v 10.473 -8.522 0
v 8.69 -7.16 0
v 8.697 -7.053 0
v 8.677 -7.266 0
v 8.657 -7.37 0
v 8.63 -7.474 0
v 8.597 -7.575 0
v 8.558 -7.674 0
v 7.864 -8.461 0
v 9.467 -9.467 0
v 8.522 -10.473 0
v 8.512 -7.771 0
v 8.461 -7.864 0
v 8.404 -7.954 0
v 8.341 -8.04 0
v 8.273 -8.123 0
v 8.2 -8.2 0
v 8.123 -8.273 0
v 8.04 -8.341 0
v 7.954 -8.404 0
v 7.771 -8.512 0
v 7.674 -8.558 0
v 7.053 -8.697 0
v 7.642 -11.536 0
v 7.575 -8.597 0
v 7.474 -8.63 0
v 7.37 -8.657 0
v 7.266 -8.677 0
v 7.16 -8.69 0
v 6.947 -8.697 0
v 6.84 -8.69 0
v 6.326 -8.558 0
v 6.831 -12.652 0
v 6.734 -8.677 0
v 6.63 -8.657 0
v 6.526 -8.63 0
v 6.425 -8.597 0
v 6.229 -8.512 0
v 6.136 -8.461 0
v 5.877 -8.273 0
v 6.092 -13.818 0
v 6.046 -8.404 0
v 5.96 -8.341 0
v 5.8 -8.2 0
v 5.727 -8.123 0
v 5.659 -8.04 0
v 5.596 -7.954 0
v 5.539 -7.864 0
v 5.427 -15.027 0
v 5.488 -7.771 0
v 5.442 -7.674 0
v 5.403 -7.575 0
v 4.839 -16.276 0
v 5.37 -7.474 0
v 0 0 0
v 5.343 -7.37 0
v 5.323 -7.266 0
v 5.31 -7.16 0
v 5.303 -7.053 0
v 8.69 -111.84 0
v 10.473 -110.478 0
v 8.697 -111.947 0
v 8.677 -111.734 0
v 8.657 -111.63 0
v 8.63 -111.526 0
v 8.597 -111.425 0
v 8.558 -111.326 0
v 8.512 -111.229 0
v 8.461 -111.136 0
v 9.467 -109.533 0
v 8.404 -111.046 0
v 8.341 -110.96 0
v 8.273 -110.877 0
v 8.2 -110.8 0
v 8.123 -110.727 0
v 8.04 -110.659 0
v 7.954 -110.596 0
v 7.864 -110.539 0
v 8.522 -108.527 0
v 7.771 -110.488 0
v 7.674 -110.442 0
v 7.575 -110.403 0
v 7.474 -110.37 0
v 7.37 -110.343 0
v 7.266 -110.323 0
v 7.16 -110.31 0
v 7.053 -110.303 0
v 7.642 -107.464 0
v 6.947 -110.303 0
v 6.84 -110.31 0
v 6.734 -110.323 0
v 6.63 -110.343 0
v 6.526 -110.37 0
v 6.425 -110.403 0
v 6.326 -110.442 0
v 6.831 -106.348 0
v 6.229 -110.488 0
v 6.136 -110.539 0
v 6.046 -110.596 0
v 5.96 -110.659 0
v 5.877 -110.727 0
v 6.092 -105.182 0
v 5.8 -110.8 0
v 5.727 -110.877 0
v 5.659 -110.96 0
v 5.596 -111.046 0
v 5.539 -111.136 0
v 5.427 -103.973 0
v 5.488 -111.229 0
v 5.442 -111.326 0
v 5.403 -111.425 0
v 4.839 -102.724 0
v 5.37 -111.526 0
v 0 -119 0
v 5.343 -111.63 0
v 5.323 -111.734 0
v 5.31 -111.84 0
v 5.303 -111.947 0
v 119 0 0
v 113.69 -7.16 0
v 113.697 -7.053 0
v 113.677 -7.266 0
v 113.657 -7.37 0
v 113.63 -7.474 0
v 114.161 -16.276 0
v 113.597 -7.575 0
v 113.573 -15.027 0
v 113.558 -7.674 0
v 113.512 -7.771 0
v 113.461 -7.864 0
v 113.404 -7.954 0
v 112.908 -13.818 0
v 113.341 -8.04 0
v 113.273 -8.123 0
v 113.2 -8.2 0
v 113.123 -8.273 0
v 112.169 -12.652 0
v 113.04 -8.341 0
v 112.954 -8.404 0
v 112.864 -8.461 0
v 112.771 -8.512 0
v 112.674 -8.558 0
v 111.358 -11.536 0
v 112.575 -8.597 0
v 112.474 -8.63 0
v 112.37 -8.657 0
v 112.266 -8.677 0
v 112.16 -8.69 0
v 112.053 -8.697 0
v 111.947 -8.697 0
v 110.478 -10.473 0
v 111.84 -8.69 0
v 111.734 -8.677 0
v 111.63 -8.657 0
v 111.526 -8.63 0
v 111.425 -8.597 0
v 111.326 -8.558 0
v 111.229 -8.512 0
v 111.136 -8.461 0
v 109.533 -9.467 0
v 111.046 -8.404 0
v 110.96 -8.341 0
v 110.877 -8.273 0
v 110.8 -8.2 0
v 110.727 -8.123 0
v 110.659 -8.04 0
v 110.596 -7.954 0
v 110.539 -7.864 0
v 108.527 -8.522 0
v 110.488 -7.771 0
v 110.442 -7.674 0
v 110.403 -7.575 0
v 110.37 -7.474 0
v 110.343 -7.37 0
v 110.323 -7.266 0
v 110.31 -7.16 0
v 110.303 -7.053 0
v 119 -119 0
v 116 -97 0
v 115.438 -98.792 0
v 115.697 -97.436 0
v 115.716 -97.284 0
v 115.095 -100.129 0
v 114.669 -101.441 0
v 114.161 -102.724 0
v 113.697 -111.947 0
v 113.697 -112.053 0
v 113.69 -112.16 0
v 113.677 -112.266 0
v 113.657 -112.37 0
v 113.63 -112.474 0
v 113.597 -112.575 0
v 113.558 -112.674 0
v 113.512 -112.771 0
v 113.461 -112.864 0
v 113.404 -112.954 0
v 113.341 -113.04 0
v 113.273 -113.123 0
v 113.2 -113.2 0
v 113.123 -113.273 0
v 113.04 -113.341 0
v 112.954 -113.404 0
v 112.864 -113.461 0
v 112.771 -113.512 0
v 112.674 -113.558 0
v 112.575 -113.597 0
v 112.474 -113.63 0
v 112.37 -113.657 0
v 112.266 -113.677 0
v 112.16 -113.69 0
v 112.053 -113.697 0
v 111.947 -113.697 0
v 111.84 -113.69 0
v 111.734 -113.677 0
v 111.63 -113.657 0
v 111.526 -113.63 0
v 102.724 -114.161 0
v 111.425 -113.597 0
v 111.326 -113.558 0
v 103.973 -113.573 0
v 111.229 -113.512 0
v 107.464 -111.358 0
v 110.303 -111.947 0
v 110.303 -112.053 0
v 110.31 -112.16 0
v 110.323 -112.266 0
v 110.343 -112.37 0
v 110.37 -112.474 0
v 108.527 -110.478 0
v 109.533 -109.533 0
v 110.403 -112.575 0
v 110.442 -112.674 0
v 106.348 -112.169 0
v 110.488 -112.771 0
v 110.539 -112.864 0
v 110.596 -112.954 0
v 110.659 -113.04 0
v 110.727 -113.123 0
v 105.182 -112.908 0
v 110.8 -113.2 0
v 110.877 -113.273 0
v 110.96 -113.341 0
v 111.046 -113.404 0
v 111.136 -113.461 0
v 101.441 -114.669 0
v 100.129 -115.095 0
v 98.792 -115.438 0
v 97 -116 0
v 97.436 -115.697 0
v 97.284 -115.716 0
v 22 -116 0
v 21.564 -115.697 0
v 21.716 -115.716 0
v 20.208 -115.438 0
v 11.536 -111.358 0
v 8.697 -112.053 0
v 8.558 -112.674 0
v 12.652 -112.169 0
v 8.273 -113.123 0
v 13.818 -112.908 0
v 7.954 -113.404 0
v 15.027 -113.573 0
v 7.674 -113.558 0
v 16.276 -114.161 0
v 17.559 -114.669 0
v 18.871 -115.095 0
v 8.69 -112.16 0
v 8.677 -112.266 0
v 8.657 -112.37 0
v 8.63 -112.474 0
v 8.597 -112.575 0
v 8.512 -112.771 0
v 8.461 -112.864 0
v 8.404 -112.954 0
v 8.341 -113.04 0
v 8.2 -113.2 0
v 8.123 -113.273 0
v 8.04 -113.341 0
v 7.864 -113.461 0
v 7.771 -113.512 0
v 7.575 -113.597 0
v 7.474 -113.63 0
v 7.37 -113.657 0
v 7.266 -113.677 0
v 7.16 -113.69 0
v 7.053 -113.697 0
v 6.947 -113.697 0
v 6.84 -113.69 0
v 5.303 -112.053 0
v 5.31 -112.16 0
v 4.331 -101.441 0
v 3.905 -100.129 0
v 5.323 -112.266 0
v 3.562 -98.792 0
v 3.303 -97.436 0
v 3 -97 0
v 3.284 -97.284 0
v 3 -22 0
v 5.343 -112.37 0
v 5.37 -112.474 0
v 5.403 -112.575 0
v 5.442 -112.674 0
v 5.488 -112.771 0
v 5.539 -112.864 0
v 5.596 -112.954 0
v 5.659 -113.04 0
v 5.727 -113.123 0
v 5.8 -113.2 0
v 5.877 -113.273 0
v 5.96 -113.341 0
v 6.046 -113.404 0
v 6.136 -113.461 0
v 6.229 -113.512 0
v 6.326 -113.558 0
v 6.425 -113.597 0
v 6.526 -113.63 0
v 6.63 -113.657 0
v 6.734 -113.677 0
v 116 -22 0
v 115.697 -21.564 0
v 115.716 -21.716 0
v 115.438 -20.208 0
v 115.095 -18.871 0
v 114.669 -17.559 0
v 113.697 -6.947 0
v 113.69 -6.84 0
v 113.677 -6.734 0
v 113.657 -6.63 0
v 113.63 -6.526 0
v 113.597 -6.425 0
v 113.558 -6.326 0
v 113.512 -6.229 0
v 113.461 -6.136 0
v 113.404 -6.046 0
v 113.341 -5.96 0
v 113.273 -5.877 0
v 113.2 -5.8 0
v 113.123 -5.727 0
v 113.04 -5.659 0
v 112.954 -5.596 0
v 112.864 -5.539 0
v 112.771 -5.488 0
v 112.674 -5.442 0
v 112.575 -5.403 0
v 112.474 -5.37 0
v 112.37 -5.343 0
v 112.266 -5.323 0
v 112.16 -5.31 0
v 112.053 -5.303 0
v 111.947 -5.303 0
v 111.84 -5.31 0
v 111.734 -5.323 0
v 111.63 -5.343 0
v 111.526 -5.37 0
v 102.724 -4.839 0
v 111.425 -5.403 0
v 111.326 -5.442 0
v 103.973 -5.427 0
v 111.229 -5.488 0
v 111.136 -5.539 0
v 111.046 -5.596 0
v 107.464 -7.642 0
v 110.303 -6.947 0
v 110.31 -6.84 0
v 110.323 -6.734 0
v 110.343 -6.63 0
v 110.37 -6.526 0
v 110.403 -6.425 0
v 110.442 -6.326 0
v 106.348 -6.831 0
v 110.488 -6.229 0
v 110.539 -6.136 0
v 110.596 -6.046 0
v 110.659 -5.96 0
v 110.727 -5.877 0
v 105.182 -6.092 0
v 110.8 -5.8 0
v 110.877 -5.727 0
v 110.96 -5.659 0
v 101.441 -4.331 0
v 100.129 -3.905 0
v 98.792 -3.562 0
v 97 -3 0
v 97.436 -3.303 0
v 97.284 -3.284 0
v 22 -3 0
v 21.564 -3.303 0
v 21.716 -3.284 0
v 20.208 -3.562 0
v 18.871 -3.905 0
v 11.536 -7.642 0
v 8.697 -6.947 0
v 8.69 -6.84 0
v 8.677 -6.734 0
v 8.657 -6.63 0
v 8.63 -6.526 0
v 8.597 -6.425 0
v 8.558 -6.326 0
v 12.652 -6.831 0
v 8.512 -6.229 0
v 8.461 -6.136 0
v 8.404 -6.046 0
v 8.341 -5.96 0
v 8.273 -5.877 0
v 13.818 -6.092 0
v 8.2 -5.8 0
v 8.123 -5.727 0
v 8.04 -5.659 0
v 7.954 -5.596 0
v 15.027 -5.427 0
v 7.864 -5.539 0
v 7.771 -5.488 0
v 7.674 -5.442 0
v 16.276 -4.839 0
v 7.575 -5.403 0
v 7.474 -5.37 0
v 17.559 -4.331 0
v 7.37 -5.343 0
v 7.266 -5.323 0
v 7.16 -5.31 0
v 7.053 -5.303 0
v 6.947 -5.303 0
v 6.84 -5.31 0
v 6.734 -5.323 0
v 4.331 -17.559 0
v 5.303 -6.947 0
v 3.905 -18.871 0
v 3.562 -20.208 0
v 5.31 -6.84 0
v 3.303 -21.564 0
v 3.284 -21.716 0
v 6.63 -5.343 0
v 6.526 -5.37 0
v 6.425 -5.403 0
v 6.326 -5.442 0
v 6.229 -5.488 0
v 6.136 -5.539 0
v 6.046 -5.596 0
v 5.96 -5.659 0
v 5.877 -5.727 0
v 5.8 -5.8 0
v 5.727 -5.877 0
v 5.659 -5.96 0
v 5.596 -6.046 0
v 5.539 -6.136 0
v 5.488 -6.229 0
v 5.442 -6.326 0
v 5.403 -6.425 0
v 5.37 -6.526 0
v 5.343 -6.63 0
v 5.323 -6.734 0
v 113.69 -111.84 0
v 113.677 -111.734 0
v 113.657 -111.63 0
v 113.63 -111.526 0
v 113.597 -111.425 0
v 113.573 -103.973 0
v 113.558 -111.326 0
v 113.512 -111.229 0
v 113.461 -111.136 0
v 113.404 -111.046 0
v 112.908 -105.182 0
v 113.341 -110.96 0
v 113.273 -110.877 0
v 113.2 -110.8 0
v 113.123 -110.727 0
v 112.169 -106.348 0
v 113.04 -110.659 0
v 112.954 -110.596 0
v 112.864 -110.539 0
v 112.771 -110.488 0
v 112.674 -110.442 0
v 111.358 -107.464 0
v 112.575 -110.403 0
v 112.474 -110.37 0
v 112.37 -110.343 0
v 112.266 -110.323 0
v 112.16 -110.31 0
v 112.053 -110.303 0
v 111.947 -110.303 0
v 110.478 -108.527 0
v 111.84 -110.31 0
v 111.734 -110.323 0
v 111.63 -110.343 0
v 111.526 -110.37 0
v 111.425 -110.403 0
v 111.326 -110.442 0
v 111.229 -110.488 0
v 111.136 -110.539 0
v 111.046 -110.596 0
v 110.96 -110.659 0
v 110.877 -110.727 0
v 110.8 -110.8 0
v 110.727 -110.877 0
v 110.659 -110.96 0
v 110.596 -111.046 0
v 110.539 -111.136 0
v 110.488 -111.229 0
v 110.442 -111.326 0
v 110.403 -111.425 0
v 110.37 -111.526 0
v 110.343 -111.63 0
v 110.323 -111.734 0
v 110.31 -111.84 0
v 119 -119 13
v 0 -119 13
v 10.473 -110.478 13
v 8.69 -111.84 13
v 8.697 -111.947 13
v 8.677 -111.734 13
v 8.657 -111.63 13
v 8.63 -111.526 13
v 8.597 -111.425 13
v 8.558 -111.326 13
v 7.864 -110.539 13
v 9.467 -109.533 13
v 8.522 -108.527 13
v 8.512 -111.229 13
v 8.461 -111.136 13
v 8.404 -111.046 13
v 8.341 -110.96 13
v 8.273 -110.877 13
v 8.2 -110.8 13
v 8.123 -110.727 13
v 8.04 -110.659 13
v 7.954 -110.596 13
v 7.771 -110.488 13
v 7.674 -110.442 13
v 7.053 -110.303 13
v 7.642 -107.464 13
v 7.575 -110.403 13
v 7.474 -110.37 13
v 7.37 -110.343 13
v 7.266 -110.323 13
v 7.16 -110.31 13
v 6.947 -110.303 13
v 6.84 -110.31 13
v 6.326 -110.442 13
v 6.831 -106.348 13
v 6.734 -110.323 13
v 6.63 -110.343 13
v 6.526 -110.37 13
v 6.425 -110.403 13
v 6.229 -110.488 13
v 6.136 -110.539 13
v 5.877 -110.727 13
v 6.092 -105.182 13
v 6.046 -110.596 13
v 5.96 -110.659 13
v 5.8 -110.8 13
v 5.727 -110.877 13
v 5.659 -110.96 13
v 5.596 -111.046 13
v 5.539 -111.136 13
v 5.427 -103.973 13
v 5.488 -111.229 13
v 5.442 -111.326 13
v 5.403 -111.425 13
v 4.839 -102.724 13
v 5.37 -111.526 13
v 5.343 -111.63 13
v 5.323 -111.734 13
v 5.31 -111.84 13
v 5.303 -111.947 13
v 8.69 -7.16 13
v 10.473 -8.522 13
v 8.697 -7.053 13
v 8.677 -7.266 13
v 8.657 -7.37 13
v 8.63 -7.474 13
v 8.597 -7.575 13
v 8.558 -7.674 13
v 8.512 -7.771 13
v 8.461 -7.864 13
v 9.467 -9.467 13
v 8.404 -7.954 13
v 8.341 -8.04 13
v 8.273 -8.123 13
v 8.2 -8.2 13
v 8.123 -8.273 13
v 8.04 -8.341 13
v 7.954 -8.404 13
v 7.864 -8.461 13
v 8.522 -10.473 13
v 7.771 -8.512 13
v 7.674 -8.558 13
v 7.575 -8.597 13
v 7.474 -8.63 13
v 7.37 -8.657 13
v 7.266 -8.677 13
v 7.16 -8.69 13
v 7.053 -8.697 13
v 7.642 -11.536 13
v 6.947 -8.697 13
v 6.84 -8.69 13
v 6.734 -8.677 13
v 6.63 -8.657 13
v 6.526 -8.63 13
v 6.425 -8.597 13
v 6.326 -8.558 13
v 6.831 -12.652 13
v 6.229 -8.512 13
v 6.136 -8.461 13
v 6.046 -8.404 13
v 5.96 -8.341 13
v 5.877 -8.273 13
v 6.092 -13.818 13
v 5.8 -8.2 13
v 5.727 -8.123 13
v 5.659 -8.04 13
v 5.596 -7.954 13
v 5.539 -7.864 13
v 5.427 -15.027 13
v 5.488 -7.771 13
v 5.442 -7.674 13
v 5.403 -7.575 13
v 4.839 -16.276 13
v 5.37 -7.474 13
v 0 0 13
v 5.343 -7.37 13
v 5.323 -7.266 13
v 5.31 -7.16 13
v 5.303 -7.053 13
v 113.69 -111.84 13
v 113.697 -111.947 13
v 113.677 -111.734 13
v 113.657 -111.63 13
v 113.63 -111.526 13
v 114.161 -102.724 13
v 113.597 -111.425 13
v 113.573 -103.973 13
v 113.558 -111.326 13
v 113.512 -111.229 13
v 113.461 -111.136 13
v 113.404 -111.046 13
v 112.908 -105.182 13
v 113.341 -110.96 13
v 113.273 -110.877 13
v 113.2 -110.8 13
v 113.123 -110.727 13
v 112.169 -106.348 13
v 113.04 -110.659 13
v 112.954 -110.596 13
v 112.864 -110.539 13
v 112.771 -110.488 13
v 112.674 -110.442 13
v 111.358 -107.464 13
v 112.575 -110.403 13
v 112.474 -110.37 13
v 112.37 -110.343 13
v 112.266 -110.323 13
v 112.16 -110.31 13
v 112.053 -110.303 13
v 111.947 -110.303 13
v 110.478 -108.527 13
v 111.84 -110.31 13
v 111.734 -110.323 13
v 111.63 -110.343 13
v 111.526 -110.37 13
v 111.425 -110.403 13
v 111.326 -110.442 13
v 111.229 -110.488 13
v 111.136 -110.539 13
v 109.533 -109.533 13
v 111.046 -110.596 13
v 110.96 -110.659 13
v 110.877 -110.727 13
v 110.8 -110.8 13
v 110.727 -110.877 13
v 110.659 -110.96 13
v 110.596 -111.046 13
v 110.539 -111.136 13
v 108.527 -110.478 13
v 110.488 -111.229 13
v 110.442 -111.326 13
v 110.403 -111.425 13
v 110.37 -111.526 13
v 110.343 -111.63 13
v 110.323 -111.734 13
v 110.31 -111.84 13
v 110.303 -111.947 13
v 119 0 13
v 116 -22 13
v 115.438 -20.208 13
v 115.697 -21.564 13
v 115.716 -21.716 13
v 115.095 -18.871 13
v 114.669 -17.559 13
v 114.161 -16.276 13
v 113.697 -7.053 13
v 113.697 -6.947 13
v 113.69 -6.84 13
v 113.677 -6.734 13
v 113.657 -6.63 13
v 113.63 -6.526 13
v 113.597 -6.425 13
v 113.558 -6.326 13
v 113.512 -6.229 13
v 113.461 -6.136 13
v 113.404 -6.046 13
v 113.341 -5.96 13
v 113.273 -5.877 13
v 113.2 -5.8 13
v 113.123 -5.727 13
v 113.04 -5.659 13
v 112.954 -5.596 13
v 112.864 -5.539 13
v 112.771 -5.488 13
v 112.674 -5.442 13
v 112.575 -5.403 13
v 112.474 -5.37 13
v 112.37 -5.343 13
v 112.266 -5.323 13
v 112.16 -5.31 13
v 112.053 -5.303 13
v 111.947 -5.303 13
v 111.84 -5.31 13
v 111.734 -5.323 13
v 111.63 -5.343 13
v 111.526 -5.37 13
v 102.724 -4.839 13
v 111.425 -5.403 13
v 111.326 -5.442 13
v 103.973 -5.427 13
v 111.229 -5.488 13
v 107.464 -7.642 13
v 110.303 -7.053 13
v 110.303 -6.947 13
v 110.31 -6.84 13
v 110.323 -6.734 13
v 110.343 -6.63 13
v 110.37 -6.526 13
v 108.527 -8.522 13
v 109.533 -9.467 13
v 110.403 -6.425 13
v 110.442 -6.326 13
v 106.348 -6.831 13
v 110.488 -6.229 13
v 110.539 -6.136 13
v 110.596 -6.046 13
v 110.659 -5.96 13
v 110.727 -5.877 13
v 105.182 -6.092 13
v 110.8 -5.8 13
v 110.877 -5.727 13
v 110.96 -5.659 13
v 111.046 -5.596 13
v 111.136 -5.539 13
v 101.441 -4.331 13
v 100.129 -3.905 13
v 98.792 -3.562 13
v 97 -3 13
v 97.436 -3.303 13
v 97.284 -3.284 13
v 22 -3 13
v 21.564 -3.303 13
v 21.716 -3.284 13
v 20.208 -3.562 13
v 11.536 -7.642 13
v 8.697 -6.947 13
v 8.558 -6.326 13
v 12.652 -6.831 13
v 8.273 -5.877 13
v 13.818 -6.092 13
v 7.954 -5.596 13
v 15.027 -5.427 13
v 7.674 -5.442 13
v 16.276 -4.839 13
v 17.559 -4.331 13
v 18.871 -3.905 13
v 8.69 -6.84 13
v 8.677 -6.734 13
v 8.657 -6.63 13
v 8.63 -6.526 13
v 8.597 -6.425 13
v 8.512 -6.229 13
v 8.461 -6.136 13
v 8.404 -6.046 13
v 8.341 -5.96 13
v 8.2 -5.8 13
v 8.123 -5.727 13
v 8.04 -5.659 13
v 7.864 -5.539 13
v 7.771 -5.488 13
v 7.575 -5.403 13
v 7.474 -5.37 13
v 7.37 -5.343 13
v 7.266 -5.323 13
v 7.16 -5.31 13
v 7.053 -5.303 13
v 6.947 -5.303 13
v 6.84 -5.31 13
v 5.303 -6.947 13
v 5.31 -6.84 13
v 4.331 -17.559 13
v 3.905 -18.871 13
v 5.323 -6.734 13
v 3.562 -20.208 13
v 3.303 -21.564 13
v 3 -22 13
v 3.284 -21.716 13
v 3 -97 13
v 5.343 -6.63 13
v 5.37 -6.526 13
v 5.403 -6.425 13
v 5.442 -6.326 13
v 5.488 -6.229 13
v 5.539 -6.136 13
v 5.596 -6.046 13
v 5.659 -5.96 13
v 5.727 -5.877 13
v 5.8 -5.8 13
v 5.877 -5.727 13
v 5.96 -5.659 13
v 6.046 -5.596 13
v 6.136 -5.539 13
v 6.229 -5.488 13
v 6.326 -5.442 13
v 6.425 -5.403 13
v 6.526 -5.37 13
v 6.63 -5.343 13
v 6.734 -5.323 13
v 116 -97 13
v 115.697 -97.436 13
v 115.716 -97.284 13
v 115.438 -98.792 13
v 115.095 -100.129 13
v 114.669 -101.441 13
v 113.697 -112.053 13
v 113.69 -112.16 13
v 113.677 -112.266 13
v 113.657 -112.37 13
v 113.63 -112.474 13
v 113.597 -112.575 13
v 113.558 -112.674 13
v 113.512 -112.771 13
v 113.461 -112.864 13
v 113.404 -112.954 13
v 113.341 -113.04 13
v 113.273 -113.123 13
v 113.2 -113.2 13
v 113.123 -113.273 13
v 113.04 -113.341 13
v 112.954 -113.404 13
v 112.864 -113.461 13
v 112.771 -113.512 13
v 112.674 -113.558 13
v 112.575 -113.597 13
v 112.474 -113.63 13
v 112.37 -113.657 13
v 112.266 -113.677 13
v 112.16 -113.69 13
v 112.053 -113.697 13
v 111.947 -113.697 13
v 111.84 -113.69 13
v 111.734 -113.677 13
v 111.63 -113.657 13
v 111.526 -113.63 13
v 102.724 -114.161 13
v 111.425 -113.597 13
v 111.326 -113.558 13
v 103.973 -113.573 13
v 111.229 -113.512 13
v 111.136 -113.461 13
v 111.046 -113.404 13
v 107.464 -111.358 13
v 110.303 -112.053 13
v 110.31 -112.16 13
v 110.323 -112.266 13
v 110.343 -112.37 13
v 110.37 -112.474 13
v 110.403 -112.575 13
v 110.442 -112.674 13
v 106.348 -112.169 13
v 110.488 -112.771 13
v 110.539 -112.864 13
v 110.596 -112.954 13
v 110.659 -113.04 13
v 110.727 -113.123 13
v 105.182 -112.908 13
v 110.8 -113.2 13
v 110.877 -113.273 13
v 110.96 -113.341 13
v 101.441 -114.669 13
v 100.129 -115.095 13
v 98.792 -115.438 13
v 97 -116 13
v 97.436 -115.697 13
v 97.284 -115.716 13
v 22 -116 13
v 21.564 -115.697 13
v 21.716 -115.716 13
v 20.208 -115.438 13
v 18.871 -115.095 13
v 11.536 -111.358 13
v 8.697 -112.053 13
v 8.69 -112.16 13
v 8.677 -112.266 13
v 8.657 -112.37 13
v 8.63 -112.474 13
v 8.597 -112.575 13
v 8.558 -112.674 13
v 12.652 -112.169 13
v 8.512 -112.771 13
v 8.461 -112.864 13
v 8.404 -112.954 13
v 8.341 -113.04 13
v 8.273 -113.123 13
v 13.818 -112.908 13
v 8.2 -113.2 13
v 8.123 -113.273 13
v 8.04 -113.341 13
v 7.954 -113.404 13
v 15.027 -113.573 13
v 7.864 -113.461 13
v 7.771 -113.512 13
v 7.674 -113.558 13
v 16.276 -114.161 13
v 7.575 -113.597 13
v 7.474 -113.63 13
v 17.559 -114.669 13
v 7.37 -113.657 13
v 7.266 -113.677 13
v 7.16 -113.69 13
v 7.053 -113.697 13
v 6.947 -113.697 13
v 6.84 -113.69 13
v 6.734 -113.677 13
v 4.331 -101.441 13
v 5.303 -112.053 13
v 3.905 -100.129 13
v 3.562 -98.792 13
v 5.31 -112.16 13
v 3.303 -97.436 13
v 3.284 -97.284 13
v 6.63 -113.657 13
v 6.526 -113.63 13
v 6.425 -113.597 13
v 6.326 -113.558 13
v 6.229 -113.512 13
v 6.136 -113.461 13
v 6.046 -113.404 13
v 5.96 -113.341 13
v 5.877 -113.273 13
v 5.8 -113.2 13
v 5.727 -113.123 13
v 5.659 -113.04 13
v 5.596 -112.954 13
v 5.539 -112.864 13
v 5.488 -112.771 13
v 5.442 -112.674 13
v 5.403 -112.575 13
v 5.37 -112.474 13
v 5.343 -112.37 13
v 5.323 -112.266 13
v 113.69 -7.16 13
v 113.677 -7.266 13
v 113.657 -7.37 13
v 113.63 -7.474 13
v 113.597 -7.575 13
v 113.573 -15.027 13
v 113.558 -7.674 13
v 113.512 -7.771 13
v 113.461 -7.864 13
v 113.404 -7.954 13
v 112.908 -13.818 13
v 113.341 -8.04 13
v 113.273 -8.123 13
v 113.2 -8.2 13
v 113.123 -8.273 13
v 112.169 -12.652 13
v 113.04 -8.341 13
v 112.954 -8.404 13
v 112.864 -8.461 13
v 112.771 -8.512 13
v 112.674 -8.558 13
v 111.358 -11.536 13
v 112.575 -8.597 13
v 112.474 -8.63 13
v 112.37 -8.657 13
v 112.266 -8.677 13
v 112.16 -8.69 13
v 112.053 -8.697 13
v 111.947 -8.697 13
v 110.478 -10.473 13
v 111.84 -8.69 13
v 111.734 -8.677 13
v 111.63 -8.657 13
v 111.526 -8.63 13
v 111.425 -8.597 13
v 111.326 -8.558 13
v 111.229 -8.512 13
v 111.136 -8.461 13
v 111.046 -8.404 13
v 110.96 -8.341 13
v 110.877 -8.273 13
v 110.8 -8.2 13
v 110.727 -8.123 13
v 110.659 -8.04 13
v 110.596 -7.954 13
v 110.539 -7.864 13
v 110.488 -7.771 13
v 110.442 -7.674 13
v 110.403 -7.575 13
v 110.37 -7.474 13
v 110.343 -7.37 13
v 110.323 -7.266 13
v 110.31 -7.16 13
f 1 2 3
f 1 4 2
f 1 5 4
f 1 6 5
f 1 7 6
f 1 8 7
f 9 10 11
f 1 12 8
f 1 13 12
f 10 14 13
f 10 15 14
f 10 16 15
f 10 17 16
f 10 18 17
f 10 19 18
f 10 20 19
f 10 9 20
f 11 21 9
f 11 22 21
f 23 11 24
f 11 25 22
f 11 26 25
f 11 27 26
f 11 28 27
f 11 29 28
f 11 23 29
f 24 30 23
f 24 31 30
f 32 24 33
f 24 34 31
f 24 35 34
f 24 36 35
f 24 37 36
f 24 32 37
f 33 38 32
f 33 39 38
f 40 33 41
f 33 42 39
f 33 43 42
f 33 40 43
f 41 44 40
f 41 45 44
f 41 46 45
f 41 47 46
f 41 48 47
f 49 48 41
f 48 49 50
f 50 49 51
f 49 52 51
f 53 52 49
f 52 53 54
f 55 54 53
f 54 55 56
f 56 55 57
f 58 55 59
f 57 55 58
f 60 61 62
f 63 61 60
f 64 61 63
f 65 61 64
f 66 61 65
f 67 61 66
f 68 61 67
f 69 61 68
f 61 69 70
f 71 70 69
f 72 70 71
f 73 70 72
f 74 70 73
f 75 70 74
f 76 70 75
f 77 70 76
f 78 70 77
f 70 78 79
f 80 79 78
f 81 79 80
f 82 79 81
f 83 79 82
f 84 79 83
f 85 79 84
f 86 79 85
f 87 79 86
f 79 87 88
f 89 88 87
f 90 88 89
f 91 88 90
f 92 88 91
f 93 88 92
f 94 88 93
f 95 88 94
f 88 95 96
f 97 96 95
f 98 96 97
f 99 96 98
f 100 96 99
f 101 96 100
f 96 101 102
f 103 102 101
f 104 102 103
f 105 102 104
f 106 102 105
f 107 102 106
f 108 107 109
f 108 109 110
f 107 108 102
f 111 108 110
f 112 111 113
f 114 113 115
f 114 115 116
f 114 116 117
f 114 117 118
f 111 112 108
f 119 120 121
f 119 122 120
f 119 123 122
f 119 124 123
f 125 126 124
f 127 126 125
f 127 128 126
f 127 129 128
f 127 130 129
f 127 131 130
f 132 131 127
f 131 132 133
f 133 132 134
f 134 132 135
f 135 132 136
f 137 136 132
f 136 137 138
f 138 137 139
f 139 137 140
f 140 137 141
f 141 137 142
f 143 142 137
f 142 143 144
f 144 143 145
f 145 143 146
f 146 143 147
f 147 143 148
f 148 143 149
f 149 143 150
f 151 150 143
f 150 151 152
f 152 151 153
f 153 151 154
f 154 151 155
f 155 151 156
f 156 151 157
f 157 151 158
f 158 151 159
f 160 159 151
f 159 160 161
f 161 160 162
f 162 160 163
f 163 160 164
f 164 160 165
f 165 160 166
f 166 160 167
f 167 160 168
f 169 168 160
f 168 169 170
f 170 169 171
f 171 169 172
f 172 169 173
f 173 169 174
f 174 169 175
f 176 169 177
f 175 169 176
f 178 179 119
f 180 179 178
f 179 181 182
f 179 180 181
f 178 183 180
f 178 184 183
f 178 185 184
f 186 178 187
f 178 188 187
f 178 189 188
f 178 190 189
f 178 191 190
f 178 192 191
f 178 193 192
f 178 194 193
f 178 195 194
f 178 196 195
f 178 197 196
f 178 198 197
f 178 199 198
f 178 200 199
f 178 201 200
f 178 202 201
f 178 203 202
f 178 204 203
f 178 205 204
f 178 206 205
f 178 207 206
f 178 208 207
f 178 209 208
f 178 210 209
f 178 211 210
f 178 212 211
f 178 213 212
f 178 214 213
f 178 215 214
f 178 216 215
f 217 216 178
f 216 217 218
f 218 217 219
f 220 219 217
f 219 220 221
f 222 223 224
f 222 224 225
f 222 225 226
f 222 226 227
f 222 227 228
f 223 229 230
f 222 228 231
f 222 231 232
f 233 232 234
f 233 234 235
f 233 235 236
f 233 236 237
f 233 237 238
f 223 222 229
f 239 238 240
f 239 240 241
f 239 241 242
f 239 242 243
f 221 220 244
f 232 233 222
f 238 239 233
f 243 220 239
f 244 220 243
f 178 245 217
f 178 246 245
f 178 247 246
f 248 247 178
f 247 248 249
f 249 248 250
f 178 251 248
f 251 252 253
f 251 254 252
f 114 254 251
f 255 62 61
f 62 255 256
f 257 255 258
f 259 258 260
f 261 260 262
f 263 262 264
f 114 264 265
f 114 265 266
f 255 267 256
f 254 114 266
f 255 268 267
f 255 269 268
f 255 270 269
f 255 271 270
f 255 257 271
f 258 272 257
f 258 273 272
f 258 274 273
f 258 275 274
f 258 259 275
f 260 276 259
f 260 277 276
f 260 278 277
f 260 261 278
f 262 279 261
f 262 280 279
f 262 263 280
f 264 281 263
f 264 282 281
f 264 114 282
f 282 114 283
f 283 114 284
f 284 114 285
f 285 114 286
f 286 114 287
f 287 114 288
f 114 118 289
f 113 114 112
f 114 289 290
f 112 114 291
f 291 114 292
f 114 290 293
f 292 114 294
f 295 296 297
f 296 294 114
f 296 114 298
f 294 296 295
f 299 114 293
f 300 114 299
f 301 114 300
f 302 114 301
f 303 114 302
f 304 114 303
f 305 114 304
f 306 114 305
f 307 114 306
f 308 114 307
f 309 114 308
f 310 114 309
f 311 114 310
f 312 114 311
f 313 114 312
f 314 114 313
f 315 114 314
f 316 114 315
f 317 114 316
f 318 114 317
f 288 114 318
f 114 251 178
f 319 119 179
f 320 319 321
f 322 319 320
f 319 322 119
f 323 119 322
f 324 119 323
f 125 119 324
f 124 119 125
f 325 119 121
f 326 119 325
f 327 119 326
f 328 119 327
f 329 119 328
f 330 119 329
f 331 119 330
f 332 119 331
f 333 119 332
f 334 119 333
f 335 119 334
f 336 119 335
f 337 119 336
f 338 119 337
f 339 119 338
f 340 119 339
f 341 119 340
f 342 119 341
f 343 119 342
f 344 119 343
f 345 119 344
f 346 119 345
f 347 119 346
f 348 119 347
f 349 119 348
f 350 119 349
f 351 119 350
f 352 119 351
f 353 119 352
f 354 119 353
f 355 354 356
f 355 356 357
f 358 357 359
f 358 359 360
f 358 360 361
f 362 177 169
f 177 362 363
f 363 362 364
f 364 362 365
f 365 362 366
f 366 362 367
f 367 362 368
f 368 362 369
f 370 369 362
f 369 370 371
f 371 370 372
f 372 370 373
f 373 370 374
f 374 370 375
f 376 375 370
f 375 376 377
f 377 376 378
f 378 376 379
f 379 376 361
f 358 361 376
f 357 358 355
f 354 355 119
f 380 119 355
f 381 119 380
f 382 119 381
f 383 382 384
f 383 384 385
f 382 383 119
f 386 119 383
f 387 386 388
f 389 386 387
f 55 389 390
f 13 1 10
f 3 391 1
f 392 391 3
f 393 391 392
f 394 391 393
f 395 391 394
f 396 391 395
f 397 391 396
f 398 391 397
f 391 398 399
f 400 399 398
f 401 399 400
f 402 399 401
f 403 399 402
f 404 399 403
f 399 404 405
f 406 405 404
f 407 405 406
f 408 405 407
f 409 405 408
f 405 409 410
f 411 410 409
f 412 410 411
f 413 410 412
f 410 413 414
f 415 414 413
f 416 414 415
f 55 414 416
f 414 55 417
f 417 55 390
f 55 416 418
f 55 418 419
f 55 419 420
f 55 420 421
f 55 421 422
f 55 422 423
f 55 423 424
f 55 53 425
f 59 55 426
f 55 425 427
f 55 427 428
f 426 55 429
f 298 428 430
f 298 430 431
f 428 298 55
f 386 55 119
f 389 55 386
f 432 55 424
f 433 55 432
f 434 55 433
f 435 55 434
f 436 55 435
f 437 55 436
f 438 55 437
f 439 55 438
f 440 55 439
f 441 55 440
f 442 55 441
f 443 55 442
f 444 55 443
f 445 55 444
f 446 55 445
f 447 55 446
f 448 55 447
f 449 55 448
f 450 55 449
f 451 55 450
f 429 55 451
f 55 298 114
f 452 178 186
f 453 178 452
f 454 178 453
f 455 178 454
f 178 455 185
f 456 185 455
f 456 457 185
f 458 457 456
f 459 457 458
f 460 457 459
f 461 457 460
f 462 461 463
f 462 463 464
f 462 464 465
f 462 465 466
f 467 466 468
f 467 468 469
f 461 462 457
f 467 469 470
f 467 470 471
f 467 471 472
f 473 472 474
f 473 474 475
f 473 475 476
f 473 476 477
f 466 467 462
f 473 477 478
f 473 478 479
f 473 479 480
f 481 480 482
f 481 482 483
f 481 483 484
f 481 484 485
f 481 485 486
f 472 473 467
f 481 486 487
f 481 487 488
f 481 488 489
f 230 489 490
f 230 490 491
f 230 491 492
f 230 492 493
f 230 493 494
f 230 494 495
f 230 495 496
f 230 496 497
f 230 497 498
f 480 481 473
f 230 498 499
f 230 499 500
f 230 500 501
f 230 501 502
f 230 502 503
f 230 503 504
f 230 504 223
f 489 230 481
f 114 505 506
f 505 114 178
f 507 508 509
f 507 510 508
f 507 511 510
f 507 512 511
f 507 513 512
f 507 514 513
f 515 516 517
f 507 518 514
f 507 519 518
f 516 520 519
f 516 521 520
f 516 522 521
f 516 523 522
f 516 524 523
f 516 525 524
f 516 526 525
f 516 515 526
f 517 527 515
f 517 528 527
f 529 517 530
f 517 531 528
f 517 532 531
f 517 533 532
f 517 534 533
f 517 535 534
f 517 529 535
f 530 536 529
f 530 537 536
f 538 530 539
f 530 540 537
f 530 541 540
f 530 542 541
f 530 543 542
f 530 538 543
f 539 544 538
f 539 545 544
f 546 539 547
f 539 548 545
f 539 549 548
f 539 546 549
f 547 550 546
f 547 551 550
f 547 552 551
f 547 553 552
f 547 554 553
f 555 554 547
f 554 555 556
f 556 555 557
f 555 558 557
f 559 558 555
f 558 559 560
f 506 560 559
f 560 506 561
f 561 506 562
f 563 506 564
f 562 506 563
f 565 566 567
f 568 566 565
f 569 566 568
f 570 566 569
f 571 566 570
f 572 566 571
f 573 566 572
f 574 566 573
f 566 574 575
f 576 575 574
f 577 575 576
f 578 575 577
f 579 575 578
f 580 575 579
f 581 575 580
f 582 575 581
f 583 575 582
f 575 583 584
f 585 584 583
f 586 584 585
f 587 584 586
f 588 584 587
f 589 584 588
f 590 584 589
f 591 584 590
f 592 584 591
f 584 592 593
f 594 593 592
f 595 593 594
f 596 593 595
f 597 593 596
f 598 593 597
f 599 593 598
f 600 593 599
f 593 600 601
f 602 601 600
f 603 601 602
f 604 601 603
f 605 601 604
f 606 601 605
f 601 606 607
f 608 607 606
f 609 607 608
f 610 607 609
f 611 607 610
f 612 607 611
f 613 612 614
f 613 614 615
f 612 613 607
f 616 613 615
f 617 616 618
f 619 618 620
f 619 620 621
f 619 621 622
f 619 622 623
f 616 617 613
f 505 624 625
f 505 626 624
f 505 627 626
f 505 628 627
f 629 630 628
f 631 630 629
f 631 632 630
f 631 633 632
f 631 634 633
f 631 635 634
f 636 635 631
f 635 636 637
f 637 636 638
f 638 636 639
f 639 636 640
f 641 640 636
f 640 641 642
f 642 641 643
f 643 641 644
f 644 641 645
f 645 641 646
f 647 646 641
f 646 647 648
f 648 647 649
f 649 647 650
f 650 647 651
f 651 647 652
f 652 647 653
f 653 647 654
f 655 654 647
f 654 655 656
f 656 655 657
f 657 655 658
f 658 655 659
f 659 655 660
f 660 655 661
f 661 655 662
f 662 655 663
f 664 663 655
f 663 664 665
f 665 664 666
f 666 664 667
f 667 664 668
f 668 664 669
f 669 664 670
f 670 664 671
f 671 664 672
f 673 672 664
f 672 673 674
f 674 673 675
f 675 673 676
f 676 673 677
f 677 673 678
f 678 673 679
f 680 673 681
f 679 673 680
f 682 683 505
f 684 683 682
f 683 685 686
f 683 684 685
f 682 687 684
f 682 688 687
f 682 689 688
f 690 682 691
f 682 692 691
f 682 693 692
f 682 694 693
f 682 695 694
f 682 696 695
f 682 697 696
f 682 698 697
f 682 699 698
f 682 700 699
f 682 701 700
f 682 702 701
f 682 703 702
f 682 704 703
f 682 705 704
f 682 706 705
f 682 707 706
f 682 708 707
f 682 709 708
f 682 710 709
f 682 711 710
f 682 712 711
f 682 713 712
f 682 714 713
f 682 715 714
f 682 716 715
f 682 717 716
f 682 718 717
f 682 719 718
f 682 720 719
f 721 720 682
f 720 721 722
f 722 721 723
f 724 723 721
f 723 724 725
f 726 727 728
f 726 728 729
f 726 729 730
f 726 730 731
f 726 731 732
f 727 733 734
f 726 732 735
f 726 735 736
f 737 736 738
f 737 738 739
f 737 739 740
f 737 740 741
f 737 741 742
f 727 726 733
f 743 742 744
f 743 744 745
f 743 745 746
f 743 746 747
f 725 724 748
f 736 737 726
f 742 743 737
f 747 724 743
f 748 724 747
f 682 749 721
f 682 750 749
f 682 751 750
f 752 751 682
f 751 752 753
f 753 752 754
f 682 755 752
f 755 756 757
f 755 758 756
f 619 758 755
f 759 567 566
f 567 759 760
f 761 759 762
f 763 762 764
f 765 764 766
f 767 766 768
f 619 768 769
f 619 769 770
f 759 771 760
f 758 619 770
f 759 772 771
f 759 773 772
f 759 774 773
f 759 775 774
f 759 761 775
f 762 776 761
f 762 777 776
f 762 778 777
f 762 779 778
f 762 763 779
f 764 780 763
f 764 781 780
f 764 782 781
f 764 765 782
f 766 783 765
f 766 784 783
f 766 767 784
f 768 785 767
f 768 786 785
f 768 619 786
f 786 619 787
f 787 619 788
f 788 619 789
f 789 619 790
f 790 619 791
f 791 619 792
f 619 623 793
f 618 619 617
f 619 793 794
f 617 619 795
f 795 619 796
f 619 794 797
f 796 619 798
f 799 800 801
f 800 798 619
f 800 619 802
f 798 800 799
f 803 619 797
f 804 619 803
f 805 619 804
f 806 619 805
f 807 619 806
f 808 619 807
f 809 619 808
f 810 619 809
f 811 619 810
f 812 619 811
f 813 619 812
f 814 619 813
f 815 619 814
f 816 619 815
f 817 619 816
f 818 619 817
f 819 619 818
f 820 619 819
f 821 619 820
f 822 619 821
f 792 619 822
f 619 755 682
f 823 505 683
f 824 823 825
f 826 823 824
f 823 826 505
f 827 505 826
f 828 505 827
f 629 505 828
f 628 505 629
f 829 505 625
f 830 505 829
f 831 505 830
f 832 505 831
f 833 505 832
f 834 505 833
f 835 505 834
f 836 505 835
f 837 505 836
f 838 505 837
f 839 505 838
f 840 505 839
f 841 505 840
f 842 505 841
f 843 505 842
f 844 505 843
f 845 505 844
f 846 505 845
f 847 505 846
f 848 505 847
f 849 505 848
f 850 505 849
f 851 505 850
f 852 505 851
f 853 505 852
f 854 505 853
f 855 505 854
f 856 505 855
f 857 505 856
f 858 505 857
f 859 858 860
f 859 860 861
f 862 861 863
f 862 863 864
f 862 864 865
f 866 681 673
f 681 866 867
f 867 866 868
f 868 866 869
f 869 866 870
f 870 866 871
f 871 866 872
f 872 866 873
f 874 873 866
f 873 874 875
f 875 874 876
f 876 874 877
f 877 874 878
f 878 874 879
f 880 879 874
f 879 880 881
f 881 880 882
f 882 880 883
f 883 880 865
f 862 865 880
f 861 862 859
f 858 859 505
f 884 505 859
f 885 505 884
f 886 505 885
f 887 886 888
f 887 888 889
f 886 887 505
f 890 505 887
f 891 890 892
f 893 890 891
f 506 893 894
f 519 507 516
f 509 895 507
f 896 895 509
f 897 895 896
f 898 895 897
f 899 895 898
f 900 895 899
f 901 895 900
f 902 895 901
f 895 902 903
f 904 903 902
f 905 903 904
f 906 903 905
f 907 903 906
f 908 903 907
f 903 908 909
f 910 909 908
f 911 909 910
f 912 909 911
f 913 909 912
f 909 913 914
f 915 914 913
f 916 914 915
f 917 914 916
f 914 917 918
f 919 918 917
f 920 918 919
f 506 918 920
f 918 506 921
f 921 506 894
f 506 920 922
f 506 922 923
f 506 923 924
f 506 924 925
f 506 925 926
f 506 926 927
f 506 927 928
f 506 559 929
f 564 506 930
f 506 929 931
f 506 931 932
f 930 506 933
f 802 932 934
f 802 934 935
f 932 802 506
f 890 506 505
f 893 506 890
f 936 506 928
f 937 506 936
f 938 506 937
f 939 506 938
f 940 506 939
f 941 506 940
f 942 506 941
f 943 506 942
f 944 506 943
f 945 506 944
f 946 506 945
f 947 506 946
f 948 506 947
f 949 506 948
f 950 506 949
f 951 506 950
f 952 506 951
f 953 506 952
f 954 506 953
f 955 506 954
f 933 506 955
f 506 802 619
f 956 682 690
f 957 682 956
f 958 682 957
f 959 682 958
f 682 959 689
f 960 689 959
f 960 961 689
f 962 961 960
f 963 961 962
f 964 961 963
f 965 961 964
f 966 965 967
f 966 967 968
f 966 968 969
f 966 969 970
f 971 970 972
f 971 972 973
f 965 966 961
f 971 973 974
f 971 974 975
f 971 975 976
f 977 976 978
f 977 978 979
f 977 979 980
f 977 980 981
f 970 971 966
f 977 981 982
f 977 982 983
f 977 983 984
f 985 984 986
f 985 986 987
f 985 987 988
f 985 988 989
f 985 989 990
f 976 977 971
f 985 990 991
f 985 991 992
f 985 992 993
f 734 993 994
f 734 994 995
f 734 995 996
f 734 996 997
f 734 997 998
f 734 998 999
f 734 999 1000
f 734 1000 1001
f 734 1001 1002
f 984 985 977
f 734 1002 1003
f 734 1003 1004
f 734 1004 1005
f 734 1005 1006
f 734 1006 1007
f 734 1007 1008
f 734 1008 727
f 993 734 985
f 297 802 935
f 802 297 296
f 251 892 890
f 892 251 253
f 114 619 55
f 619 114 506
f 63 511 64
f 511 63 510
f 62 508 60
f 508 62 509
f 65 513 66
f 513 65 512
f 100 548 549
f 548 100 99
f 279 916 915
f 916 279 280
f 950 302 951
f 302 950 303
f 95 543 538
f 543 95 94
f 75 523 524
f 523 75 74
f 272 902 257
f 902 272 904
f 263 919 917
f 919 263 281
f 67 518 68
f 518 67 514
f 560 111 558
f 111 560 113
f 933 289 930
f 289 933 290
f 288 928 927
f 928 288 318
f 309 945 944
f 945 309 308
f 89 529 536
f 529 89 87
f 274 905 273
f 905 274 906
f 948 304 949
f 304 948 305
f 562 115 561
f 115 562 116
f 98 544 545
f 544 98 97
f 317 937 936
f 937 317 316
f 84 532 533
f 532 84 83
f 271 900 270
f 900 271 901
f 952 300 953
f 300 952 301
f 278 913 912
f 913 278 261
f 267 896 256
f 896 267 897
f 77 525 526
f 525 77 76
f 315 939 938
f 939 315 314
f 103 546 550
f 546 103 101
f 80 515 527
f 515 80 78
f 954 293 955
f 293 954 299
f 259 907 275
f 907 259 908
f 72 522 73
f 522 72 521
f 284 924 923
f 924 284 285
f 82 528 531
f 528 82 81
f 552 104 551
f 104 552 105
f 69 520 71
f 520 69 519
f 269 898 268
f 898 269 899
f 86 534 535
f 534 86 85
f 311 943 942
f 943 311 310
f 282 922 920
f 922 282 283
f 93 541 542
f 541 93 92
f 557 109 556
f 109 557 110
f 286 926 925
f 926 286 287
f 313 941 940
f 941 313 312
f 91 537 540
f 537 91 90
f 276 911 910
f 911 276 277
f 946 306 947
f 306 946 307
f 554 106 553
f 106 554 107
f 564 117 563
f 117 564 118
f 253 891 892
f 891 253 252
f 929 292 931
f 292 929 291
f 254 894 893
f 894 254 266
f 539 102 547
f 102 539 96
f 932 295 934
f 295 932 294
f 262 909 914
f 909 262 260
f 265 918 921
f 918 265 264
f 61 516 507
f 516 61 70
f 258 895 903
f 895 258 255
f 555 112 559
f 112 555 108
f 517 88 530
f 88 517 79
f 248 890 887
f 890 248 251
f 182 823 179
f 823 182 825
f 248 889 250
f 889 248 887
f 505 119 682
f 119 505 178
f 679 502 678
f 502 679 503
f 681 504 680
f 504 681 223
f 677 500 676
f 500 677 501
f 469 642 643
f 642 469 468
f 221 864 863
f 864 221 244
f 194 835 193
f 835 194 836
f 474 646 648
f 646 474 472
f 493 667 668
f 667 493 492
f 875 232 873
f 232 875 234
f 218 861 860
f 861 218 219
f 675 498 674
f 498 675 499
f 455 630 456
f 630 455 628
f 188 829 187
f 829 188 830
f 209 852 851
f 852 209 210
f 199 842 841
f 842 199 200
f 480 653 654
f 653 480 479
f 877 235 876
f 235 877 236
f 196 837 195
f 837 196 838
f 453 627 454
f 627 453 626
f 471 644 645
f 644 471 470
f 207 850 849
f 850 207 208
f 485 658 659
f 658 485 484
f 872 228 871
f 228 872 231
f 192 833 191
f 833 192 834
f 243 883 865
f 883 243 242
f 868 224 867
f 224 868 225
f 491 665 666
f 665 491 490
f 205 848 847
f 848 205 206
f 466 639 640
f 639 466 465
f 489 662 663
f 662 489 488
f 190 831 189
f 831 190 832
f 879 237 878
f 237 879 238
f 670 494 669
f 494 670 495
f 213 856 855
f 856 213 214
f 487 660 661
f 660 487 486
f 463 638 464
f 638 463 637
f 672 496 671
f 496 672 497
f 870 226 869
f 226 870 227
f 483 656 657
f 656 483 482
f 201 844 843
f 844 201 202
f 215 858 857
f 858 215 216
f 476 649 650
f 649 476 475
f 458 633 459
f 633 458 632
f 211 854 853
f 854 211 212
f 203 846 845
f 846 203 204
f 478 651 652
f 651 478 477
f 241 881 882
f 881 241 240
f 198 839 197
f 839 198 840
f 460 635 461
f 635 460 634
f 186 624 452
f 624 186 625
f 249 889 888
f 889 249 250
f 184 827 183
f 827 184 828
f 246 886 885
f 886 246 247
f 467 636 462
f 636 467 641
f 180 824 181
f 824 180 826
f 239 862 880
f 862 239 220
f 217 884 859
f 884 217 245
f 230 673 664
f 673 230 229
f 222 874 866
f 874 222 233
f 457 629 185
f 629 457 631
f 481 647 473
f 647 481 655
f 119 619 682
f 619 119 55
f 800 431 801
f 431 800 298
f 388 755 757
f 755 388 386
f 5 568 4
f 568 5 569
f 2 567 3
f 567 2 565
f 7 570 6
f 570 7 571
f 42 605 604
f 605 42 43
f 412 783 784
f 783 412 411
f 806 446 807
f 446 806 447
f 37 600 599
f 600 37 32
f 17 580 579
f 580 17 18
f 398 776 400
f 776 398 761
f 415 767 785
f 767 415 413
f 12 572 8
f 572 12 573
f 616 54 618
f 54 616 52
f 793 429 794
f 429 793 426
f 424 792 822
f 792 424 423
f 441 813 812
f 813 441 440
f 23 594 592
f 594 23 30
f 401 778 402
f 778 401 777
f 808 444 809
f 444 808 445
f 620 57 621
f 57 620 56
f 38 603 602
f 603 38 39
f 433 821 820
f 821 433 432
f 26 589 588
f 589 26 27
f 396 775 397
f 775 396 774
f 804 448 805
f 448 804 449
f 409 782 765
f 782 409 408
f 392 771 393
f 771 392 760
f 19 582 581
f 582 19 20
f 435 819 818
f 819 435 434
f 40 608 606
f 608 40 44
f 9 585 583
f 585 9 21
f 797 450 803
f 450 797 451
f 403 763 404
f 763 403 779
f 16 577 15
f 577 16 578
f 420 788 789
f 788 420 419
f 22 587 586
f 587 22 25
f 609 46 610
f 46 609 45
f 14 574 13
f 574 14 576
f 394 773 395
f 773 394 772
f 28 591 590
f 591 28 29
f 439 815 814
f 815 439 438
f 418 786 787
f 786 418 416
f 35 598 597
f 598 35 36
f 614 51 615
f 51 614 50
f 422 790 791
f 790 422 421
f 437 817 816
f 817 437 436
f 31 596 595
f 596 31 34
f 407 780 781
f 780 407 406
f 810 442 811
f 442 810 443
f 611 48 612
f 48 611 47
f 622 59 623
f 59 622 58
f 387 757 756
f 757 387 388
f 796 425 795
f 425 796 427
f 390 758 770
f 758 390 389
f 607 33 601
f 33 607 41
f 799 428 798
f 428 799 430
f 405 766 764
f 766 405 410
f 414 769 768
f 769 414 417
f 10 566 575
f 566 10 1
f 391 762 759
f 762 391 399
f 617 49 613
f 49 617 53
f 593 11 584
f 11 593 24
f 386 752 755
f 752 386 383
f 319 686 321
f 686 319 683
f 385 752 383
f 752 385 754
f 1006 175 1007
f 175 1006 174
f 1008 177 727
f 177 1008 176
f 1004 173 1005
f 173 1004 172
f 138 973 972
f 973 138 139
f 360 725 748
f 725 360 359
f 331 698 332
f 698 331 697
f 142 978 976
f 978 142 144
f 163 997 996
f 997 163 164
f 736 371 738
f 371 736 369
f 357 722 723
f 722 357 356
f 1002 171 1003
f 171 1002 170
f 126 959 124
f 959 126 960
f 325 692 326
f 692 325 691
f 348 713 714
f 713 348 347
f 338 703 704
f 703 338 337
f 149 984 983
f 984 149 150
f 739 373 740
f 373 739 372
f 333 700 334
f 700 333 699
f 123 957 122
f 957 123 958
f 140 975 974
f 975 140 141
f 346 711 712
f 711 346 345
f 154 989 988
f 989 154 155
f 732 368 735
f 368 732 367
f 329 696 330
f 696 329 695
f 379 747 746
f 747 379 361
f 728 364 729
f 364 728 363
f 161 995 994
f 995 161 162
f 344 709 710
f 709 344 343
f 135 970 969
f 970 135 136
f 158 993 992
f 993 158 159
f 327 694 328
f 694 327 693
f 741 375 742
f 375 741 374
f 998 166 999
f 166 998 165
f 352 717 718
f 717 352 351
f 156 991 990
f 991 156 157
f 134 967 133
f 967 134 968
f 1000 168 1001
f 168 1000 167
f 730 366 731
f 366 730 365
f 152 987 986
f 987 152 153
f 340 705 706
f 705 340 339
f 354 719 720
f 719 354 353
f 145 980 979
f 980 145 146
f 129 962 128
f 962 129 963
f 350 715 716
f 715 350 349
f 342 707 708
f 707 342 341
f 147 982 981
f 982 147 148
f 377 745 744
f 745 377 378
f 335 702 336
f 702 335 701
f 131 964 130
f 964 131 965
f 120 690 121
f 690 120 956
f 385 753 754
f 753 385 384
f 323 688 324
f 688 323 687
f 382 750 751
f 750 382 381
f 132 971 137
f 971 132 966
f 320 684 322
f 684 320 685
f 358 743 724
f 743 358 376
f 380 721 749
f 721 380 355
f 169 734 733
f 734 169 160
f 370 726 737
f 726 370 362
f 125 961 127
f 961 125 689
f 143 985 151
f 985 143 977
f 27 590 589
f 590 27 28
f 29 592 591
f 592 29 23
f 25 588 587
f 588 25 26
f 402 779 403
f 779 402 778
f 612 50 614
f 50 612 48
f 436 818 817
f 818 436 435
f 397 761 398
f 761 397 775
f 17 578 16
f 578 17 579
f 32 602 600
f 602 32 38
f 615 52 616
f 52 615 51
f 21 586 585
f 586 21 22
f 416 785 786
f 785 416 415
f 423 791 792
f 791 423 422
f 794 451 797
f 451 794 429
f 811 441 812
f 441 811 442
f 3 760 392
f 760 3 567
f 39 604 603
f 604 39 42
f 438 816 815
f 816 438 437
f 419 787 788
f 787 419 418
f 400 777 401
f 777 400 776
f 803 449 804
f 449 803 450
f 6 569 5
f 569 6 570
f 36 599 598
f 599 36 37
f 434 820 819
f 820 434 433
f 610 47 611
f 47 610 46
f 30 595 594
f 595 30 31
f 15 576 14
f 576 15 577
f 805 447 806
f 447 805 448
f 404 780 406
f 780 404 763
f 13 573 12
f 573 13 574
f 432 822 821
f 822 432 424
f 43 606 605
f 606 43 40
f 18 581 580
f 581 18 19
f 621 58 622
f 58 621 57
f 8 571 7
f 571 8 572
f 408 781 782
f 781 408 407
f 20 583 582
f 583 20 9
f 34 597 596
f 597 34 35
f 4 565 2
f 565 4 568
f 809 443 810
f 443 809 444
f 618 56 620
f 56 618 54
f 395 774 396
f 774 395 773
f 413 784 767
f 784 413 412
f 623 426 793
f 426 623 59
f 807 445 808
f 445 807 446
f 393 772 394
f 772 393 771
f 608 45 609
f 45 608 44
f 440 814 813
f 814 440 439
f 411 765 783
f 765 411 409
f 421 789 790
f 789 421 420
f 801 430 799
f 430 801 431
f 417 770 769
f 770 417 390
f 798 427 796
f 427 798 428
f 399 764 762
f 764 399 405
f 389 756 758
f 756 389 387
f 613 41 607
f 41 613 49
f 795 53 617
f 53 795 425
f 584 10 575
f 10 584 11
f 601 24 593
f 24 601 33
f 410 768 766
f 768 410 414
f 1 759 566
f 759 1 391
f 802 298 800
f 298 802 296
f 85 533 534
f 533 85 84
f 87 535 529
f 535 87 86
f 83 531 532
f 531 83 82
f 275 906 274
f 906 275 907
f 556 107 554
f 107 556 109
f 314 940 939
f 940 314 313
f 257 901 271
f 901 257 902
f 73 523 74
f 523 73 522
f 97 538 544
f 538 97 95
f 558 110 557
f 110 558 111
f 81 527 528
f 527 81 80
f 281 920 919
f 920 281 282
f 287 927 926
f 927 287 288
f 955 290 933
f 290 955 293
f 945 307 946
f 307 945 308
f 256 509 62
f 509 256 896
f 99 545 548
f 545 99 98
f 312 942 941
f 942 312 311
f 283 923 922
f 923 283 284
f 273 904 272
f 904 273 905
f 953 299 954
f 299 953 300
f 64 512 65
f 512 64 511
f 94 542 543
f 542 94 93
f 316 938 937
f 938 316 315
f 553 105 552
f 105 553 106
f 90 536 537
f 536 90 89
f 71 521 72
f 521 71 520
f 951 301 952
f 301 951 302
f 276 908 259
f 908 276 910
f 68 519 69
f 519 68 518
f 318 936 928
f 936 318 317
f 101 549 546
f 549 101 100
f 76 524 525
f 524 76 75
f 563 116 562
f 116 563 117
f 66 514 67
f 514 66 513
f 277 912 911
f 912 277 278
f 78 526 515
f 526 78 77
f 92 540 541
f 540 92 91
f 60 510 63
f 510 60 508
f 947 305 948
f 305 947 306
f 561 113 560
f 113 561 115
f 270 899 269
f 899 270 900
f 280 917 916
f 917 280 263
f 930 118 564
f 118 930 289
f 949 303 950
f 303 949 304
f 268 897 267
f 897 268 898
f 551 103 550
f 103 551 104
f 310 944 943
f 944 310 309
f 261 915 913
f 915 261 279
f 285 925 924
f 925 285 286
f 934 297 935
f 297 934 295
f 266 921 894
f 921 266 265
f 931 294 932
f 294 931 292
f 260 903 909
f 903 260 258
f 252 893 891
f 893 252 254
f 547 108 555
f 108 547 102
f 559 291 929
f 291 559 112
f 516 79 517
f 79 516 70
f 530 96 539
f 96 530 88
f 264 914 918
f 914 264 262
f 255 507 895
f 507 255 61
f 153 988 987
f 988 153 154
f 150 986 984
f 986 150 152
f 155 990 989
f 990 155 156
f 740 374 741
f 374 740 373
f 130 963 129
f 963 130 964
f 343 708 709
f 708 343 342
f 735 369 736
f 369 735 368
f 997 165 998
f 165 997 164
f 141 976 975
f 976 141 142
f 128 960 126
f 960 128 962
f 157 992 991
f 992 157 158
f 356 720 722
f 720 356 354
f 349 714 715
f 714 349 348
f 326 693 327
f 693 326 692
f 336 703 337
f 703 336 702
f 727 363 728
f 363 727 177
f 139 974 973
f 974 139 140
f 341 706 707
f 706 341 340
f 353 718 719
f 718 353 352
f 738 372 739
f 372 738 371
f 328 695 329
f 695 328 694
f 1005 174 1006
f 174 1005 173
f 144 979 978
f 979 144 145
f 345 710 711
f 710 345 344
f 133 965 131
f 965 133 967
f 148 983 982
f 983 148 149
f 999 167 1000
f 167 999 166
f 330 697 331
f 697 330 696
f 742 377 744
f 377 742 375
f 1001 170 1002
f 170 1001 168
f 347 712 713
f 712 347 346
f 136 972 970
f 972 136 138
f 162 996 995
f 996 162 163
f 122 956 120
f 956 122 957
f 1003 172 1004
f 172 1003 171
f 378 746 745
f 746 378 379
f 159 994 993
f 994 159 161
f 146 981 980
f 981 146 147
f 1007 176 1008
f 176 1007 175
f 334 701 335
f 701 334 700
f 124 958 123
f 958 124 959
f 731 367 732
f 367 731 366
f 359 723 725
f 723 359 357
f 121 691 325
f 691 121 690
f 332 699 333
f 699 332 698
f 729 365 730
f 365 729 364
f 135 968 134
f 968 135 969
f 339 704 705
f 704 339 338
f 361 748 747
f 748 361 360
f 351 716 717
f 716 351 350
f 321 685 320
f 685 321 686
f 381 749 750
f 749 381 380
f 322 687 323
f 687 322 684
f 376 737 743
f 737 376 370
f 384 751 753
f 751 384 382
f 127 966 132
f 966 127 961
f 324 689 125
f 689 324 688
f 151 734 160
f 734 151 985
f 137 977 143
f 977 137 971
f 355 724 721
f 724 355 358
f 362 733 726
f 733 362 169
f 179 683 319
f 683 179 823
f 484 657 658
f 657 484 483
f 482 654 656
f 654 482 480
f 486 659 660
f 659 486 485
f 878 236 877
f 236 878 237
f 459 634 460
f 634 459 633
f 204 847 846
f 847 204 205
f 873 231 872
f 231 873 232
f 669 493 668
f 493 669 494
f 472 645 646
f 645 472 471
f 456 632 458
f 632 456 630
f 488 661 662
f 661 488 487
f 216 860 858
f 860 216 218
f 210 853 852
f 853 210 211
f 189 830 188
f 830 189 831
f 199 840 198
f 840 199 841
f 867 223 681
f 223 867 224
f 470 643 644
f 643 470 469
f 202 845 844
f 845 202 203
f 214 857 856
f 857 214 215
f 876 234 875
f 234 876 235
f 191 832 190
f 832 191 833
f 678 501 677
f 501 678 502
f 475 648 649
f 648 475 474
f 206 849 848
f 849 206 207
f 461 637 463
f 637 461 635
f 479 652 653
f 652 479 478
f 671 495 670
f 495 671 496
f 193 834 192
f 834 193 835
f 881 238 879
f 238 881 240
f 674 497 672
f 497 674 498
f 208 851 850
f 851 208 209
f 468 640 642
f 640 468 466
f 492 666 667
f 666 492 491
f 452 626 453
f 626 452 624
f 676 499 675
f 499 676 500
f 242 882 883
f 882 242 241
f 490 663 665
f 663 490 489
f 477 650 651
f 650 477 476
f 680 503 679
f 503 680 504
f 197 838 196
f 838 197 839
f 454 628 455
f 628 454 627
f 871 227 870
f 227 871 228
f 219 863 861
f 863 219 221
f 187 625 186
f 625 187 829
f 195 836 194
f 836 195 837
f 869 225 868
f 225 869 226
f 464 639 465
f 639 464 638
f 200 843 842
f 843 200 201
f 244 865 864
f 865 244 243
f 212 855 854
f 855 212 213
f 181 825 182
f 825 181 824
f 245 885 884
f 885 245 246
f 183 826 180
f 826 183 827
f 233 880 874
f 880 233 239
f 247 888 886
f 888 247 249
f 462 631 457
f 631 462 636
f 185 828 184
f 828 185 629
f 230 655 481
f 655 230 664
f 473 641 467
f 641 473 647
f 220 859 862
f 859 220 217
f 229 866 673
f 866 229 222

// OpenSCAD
// file: fantools.scad
module fan_corner(height=40, screw_height=26, screw_diameter=3.4, screw_head_diameter=7.8, hole_offset=5, outside_wall_length=25, inner_cutout_r=22, fan_mounts=false){
  difference(){
    linear_extrude(height=height){
      polygon(points=[[0,0],[outside_wall_length,0],[0,outside_wall_length]], paths=[[0,1,2]],convexity=10);
    }
    translate([hole_offset, hole_offset, 0]){
      cylinder(r=screw_diameter/2,h=screw_height);
      translate([0,0,screw_height]){
        cylinder(r=screw_head_diameter/2,height-screw_height);
      }
    }
    translate([outside_wall_length,outside_wall_length,0]){
      cylinder(r=inner_cutout_r,h=height);
    }
  }
  if (fan_mounts == true){
    translate([hole_offset, hole_offset, -4]){
      cylinder(r=2.2,h=6);
    }
  }
}

// this builds supports for one corner with a wall section to the
// middle of the radiator
module fan_corner_support(height=40, screw_height=26, screw_diameter=3.4, screw_head_diameter=7.8, hole_offset=5, hole_distance=136, outside_wall_length=25, wall_width=3, inner_cutout_r=22){
  fan_corner(height, screw_height, screw_diameter, screw_head_diameter, hole_offset, outside_wall_length, inner_cutout_r);
  translate([hole_offset+screw_head_diameter,0,0]){
    linear_extrude(height=height){
      square(size=[hole_distance/2-hole_offset-screw_head_diameter,wall_width], center=false);
    }
  }
}

// this just mirrors and moves a second corner support, generating a full
// leg mountable on two corners with a thin wall, suitable for the legs
// left and right of the radiator
module fan_side_support(height=40, screw_height=26, screw_diameter=3.4, screw_head_diameter=7.8, hole_offset=5, hole_distance=136, outside_wall_length=25, wall_width=3, inner_cutout_r=22){
  fan_corner_support(height, screw_height, screw_diameter, screw_head_diameter, hole_offset, hole_distance, outside_wall_length, wall_width, inner_cutout_r);

  translate([hole_distance,0,0]){
    mirror([1,0,0]){fan_corner_support(height, screw_height, screw_diameter, screw_head_diameter, hole_offset, hole_distance, outside_wall_length, wall_width, inner_cutout_r);}
  }
}
// main file
$fn=50;

include <fantools.scad>

translate([0,-119,0]) fan_side_support(hole_offset=7, hole_distance=119, height=13);
mirror([0,1,0]) fan_side_support(hole_offset=7, hole_distance=119, height=13);
rotate([0,0,270]) fan_side_support(hole_offset=7, hole_distance=119, height=13);
translate([119,0,0]) mirror([1,0,0]) rotate([0,0,270]) fan_side_support(hole_offset=7, hole_distance=119, height=13);
